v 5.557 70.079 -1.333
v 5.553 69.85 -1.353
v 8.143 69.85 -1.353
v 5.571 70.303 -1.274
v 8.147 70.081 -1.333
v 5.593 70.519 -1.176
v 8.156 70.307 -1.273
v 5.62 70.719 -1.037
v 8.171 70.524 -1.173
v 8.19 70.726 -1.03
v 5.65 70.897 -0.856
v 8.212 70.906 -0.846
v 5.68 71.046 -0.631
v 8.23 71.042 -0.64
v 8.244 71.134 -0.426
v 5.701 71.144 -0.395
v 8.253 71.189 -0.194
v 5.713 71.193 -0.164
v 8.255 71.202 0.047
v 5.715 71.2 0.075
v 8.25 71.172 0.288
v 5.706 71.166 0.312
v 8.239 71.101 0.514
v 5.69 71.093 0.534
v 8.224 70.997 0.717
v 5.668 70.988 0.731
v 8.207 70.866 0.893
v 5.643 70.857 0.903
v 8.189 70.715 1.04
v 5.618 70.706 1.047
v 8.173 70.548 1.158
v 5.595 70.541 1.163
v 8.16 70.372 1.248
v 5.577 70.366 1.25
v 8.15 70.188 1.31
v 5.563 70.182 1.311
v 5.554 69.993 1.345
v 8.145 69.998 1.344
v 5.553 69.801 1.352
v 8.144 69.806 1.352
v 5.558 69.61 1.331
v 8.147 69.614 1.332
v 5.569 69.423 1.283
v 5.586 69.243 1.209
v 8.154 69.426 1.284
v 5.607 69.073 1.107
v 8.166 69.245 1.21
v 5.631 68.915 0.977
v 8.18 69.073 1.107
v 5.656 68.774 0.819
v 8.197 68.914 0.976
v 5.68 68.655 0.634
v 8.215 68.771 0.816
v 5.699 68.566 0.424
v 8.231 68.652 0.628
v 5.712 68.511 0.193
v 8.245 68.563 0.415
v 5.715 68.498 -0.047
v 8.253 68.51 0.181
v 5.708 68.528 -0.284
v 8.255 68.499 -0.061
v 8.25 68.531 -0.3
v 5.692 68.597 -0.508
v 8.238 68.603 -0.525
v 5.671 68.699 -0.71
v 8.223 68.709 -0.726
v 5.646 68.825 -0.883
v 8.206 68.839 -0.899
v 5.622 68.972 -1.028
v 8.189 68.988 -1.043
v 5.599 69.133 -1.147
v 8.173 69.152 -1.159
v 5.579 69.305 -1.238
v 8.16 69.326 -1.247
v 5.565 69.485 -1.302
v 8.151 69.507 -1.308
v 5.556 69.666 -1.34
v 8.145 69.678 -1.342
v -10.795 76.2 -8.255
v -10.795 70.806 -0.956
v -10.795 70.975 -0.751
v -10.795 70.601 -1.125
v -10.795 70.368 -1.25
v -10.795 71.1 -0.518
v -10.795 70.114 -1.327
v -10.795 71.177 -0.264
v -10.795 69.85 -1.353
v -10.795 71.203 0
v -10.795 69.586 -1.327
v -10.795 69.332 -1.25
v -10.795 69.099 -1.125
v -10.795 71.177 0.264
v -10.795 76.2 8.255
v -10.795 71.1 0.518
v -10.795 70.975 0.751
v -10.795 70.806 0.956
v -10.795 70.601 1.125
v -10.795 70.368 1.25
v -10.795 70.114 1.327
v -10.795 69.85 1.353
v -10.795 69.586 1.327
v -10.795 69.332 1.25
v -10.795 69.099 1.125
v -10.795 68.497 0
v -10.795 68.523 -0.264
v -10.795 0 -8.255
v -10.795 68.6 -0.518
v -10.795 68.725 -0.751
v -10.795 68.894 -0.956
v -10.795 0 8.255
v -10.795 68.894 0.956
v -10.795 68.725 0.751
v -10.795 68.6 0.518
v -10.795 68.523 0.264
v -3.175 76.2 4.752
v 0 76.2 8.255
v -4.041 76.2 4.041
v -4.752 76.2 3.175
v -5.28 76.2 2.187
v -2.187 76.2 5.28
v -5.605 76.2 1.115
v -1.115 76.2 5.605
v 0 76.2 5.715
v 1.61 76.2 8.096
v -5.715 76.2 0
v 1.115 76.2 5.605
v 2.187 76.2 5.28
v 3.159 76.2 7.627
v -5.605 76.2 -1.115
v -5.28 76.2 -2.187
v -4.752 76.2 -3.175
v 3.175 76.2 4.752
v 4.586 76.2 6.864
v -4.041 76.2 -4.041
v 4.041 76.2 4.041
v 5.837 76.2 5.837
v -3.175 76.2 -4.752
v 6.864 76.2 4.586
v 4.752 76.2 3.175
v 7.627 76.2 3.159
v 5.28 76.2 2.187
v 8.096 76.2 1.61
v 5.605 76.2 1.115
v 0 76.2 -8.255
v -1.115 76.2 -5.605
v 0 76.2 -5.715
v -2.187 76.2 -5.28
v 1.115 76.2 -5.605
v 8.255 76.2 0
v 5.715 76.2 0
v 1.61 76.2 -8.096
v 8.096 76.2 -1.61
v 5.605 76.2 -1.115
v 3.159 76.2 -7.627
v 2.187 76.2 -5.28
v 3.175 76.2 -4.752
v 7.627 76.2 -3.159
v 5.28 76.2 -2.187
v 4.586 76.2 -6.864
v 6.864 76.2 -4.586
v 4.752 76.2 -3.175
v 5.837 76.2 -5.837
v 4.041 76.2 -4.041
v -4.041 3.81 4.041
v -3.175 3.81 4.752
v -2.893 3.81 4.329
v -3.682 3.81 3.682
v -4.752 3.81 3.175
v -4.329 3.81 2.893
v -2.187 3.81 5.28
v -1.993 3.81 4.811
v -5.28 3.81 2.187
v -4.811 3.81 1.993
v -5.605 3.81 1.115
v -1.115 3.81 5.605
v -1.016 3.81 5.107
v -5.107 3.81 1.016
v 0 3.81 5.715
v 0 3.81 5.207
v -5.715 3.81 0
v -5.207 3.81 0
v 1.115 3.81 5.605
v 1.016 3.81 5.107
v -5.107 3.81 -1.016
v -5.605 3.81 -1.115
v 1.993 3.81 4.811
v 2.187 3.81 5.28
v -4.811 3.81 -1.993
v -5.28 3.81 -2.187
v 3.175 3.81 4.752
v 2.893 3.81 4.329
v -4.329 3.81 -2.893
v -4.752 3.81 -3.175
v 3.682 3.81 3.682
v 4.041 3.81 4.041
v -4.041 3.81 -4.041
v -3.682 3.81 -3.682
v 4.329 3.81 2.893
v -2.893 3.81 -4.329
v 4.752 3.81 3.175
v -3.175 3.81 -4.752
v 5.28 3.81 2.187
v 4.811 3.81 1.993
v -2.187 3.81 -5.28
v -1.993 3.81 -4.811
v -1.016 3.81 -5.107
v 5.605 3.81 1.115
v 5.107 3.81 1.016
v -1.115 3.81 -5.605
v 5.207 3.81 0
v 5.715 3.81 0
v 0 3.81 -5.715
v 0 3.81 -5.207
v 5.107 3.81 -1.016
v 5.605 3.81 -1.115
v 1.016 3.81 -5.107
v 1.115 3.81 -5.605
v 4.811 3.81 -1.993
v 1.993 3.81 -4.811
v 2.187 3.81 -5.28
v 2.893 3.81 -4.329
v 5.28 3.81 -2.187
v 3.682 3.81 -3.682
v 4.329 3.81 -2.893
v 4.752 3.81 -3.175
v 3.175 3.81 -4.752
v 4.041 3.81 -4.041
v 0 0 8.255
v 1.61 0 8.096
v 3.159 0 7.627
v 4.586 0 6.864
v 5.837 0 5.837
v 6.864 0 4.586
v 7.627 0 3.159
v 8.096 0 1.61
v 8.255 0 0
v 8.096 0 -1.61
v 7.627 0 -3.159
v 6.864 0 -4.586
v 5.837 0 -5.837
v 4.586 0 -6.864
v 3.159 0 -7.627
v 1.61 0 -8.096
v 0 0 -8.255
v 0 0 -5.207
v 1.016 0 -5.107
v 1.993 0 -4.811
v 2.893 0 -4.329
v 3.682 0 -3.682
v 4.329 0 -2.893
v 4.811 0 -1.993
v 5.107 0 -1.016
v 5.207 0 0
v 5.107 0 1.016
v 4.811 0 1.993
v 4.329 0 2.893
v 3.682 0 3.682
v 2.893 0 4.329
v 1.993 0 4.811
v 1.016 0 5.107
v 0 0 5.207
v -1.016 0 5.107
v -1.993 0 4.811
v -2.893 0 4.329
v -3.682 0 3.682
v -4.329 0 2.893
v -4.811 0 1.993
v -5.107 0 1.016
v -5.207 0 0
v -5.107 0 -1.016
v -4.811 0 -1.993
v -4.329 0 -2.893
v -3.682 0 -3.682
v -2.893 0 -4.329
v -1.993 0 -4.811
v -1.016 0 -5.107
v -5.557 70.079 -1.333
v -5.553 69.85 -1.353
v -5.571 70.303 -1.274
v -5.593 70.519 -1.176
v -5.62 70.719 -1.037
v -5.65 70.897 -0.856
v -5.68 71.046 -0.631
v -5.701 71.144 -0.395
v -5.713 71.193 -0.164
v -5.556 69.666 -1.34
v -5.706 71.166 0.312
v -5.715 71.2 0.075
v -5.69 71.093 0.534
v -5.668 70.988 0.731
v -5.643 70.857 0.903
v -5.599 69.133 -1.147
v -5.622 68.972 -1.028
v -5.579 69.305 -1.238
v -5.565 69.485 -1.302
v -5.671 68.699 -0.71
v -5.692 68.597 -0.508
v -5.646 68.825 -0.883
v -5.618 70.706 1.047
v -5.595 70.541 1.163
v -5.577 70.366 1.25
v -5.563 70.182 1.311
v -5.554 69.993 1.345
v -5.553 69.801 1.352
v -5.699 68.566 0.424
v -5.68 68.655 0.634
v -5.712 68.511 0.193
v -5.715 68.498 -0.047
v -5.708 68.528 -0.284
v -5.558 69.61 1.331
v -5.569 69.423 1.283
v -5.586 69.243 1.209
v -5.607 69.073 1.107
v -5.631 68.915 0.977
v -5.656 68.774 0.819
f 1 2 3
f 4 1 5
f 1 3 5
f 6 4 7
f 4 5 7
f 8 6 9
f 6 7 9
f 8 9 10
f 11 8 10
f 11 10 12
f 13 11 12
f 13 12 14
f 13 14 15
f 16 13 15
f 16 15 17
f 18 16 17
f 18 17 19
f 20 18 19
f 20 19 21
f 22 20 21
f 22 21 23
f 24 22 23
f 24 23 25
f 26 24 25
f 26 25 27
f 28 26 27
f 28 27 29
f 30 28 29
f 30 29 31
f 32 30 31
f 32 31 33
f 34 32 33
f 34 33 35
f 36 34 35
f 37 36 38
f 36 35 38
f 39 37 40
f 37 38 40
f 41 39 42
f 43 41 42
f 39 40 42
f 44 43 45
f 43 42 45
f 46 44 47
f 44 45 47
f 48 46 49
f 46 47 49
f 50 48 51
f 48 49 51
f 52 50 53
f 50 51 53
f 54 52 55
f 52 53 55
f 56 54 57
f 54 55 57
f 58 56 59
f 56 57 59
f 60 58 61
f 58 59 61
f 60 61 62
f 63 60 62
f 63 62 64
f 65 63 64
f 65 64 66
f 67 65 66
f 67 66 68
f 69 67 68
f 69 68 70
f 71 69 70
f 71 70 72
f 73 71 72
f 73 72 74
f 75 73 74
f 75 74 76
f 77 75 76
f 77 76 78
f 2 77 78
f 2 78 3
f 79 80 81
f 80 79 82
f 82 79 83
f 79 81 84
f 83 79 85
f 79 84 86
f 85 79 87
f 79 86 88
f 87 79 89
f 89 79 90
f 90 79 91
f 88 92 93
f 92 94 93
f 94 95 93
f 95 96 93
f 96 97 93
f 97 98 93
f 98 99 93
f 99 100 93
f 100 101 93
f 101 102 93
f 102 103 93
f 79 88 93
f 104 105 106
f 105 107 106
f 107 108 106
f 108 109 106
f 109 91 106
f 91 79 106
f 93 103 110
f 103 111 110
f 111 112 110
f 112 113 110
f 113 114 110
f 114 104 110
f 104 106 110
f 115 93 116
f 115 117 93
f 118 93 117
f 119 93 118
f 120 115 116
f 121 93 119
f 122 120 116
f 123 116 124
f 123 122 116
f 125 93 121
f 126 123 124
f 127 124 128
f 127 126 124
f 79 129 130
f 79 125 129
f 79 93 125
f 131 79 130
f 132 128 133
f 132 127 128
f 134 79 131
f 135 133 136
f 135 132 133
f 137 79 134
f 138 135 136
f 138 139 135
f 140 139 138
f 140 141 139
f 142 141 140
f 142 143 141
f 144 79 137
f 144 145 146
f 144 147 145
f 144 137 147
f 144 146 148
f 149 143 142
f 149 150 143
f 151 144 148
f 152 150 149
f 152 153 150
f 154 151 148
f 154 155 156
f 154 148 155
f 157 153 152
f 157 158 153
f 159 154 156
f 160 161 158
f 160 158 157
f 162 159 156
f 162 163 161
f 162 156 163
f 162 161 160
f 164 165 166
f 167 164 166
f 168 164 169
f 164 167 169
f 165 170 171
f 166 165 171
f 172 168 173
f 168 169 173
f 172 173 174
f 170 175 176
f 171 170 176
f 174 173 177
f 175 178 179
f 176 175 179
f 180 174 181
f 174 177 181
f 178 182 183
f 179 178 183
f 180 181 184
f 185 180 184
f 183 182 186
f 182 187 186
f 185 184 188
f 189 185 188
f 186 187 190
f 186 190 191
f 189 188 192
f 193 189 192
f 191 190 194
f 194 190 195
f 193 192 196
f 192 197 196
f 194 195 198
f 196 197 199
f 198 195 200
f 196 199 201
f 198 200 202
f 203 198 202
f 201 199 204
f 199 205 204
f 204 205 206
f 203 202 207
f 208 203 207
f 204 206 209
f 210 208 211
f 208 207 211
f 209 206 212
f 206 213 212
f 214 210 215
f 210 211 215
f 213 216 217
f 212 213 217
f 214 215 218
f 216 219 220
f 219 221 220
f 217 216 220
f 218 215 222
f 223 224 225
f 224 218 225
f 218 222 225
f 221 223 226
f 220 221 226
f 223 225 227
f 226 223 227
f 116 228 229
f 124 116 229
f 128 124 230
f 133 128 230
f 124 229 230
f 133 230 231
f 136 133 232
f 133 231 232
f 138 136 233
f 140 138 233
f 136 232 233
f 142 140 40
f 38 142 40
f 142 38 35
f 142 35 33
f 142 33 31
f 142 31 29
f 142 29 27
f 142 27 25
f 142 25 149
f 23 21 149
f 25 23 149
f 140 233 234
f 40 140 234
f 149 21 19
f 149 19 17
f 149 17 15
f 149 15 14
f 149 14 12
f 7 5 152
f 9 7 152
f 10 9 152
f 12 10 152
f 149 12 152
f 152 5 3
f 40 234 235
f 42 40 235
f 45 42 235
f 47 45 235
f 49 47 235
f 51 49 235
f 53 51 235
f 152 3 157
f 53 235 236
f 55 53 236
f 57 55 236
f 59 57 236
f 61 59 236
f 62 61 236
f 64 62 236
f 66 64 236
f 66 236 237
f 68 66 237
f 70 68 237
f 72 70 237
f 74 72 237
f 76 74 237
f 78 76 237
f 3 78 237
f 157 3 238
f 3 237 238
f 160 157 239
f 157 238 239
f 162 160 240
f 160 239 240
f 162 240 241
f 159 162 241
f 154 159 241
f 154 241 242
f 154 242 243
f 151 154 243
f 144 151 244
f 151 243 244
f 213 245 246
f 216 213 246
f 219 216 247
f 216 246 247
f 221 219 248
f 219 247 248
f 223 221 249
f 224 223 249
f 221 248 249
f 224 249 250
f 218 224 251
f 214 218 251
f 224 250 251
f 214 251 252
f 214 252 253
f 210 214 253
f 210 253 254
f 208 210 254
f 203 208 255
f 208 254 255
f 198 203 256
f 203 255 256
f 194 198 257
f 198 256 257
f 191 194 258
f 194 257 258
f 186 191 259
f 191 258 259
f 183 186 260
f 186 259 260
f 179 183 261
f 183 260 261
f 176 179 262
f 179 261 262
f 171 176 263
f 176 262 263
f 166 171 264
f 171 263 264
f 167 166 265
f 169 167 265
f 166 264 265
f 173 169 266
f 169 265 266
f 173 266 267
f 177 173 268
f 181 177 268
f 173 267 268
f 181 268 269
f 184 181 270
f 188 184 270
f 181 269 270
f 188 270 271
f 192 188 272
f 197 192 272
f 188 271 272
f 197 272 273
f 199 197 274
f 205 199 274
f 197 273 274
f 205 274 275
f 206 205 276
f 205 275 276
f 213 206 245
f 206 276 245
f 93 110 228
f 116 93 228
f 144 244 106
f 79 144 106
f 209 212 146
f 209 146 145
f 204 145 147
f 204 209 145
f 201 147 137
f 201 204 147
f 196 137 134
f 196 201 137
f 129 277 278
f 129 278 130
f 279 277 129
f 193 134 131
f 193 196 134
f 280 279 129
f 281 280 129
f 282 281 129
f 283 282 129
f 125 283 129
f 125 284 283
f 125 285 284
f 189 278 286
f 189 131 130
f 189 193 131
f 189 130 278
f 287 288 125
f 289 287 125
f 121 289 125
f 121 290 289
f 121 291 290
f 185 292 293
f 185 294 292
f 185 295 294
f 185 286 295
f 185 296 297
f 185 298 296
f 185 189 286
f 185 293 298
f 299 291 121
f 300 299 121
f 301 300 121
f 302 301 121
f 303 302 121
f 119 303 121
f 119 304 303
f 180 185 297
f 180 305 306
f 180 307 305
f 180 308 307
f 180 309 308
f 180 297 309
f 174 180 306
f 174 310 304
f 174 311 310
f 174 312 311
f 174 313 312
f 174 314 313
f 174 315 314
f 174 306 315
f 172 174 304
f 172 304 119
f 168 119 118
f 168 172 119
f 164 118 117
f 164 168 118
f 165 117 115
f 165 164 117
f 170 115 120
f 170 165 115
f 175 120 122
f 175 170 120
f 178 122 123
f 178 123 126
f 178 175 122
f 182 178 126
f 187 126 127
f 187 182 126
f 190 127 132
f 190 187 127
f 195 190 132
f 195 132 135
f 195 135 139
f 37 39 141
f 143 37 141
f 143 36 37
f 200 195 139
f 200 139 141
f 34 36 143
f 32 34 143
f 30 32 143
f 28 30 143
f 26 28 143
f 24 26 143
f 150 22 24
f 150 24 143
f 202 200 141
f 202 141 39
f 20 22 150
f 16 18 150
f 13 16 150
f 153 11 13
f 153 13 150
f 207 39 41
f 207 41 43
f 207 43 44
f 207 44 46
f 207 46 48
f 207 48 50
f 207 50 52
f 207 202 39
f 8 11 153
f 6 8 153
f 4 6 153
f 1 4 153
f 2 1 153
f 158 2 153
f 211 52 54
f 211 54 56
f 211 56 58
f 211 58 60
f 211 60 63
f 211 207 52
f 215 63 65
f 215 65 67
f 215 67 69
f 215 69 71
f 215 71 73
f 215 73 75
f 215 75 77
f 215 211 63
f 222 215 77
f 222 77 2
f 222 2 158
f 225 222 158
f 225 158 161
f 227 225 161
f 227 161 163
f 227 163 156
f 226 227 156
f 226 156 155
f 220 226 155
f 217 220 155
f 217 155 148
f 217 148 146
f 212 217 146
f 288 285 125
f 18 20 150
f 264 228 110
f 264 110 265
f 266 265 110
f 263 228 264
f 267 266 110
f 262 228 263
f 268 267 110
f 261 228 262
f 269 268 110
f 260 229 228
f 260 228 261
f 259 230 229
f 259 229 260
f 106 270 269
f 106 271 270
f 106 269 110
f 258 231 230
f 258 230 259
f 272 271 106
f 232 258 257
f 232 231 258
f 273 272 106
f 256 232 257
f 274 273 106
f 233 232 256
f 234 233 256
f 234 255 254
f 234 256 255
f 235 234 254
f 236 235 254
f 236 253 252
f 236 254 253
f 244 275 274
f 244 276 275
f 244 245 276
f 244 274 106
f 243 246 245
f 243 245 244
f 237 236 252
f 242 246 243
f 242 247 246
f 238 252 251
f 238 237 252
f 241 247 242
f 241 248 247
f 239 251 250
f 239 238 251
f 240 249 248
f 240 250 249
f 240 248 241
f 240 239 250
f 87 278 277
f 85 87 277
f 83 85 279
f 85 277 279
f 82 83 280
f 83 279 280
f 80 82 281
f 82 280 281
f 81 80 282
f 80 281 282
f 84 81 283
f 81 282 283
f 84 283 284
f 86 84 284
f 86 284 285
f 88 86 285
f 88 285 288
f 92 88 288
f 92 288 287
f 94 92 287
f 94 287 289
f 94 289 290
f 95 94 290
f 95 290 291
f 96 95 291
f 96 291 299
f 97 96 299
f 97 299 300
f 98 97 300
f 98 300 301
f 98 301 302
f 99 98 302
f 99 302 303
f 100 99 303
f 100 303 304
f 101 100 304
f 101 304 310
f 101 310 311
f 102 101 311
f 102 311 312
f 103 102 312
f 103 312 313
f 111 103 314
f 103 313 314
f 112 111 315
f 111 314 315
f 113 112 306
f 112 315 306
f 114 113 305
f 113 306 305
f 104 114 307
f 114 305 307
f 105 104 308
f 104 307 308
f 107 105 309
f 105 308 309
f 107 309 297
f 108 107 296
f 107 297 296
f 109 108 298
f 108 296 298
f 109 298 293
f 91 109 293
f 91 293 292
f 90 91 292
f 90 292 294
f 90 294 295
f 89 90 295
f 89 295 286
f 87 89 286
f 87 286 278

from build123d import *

# Parameters (mm, degrees)
SKETCH1_R             = 5.715
BOSS_EXTRUDE1_DEPTH   = 76.2
SKETCH4_R             = 5.715
SKETCH4_R_2           = 5.207
BOSS_EXTRUDE2_DEPTH   = 3.81
F_6_32_TAPPED_HOLE1_D = 2.7051


with BuildPart() as part:
    # Sketch1 → Boss-Extrude1 (new body)
    with BuildSketch(Plane(origin=(0, 0, 0), x_dir=(1, 0, 0), z_dir=(0, 1, 0))):
        with BuildLine():
            Line((0, 8.255), (-10.795, 8.255))
            Line((-10.795, 8.255), (-10.795, -8.255))
            Line((-10.795, -8.255), (0, -8.255))
            ThreePointArc((0, -8.255), (8.255, 0), (0, 8.255))
        make_face()
        with Locations(Location((0, 0, 0), (0, 0, 90))):
            Circle(SKETCH1_R, mode=Mode.SUBTRACT)
    extrude(amount=BOSS_EXTRUDE1_DEPTH)

    # Sketch4 → Boss-Extrude2 (add)
    with BuildSketch(Plane.XZ):
        with Locations(Location((0, 0, 0), (0, 0, 270))):
            Circle(SKETCH4_R)
        with Locations(Location((0, 0, 0), (0, 0, 270))):
            Circle(SKETCH4_R_2, mode=Mode.SUBTRACT)
    extrude(amount=-BOSS_EXTRUDE2_DEPTH)

    # #6-32 Tapped Hole1 (through all)
    with Locations(Plane.ZY.offset(10.795)):
        with Locations((0, 69.85)):
            Hole(F_6_32_TAPPED_HOLE1_D / 2)


solid = part.part
